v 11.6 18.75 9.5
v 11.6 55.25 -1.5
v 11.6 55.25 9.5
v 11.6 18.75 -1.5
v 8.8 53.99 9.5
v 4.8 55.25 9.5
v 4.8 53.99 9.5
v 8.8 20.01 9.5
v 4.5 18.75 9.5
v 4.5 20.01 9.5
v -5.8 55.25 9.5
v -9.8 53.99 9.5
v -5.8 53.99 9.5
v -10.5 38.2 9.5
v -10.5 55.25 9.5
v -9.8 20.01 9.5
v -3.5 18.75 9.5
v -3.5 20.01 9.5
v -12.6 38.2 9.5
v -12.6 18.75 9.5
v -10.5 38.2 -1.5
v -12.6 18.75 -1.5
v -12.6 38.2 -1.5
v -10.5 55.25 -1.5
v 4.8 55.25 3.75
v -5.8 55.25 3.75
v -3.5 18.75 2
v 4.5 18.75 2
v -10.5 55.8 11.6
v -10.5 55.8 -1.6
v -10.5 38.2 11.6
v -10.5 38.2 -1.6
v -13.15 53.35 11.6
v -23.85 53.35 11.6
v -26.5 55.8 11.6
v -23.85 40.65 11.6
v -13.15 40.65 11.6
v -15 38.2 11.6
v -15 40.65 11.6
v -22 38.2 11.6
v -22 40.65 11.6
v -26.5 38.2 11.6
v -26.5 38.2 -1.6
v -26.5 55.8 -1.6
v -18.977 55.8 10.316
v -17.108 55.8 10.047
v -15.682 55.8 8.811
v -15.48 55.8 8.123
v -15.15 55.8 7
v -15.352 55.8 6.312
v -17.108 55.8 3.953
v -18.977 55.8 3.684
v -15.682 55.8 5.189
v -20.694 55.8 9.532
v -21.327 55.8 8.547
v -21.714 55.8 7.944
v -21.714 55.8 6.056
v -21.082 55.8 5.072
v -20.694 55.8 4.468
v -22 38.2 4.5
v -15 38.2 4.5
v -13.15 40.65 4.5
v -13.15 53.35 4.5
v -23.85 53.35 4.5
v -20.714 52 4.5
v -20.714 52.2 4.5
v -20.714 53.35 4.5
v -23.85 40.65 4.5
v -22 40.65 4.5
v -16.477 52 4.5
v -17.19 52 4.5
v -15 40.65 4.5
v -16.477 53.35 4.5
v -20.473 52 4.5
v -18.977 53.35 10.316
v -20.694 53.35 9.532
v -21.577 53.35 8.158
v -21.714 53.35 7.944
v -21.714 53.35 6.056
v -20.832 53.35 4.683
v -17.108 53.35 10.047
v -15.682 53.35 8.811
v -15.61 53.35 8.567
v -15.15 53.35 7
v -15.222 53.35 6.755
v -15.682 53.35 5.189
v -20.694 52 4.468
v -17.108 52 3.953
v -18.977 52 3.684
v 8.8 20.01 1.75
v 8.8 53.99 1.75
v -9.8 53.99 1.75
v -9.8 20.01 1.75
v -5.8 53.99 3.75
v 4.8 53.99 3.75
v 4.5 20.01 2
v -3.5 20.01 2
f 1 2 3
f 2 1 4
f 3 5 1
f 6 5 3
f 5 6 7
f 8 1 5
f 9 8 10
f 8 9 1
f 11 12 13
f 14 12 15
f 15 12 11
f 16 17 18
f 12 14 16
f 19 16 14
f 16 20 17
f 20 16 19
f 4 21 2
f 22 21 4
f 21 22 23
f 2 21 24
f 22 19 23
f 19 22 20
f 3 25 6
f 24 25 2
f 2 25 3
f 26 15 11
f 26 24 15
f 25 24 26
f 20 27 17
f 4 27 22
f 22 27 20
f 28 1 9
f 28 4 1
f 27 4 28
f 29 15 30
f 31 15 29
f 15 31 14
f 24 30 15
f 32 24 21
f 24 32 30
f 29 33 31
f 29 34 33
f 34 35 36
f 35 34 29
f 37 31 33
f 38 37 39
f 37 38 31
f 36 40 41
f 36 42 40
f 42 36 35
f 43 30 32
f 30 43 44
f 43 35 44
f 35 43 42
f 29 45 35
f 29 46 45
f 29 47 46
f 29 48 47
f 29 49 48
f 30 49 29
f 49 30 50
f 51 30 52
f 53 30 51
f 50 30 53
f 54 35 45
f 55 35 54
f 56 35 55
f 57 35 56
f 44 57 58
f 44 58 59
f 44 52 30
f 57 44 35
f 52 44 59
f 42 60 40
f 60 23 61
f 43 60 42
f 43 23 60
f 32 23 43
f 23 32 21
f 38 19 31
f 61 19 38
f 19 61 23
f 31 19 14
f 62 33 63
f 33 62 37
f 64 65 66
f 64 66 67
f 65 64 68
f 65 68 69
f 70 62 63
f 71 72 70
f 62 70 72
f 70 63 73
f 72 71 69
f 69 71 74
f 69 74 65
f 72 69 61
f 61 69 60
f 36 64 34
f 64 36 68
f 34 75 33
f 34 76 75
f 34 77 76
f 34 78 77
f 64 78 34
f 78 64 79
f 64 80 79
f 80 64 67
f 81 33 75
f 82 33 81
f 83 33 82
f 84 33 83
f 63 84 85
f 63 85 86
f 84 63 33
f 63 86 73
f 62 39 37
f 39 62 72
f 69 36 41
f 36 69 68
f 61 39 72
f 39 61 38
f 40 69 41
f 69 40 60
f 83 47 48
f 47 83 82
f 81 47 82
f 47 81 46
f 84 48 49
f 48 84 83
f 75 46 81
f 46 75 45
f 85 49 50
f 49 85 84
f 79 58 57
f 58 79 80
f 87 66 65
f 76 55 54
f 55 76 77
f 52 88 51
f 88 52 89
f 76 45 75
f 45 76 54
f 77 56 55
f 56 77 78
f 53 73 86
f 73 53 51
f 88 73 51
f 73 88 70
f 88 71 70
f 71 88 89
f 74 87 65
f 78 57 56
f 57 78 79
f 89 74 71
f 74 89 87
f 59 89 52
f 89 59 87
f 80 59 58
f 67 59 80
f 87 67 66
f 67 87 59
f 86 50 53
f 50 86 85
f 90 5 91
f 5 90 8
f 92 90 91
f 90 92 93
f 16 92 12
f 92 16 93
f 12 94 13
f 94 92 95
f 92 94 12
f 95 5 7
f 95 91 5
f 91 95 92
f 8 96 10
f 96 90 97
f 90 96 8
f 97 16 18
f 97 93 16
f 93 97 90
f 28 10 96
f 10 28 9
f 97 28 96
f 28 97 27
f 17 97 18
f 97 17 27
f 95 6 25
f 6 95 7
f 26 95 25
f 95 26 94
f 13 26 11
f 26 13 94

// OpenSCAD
difference () {
  union () {
    translate ([-0.5, 37, 4]) {
      difference () {
        cube ([24.2, 36.5, 11.0], center=true);
        translate ([0, 0, 2]) {
        }
      }
    }
    translate ([-18.5, 47.0, 5]) {
      difference () {
        cube ([16.0, 17.6, 13.2], center=true);
      }
    }
  }
  translate ([0, 0, 0]) {
    union () {
      translate ([-18.5, 47.0, 10.0]) {
        cube ([10.7, 12.7, 11], center=true);
      }
      translate ([-18.5, 40.5, 8.5]) {
        cube ([7.0, 6.0, 8.0], center=true);
      }
      translate ([-18.5, 57.0, 7]) {
        rotate (a=90.0002104591497, v=[1, 0, 0]) {
          cylinder (h=10, r=3.35, center=true);
        }
      }
    }
    translate ([0, 0, 0]) {
      translate ([0, 0, 2]) {
        union () {
          translate ([-0.5, 37, 4.5]) {
            cube ([18.6, 33.98, 9.5], center=true);
          }
          translate ([0.5, 19, 4.75]) {
            cube ([8.0, 10.6, 9.5], center=true);
          }
          translate ([-0.5, 47, 4.75]) {
            cube ([10.6, 35.6, 6], center=true);
          }
        }
      }
    }
  }
}
